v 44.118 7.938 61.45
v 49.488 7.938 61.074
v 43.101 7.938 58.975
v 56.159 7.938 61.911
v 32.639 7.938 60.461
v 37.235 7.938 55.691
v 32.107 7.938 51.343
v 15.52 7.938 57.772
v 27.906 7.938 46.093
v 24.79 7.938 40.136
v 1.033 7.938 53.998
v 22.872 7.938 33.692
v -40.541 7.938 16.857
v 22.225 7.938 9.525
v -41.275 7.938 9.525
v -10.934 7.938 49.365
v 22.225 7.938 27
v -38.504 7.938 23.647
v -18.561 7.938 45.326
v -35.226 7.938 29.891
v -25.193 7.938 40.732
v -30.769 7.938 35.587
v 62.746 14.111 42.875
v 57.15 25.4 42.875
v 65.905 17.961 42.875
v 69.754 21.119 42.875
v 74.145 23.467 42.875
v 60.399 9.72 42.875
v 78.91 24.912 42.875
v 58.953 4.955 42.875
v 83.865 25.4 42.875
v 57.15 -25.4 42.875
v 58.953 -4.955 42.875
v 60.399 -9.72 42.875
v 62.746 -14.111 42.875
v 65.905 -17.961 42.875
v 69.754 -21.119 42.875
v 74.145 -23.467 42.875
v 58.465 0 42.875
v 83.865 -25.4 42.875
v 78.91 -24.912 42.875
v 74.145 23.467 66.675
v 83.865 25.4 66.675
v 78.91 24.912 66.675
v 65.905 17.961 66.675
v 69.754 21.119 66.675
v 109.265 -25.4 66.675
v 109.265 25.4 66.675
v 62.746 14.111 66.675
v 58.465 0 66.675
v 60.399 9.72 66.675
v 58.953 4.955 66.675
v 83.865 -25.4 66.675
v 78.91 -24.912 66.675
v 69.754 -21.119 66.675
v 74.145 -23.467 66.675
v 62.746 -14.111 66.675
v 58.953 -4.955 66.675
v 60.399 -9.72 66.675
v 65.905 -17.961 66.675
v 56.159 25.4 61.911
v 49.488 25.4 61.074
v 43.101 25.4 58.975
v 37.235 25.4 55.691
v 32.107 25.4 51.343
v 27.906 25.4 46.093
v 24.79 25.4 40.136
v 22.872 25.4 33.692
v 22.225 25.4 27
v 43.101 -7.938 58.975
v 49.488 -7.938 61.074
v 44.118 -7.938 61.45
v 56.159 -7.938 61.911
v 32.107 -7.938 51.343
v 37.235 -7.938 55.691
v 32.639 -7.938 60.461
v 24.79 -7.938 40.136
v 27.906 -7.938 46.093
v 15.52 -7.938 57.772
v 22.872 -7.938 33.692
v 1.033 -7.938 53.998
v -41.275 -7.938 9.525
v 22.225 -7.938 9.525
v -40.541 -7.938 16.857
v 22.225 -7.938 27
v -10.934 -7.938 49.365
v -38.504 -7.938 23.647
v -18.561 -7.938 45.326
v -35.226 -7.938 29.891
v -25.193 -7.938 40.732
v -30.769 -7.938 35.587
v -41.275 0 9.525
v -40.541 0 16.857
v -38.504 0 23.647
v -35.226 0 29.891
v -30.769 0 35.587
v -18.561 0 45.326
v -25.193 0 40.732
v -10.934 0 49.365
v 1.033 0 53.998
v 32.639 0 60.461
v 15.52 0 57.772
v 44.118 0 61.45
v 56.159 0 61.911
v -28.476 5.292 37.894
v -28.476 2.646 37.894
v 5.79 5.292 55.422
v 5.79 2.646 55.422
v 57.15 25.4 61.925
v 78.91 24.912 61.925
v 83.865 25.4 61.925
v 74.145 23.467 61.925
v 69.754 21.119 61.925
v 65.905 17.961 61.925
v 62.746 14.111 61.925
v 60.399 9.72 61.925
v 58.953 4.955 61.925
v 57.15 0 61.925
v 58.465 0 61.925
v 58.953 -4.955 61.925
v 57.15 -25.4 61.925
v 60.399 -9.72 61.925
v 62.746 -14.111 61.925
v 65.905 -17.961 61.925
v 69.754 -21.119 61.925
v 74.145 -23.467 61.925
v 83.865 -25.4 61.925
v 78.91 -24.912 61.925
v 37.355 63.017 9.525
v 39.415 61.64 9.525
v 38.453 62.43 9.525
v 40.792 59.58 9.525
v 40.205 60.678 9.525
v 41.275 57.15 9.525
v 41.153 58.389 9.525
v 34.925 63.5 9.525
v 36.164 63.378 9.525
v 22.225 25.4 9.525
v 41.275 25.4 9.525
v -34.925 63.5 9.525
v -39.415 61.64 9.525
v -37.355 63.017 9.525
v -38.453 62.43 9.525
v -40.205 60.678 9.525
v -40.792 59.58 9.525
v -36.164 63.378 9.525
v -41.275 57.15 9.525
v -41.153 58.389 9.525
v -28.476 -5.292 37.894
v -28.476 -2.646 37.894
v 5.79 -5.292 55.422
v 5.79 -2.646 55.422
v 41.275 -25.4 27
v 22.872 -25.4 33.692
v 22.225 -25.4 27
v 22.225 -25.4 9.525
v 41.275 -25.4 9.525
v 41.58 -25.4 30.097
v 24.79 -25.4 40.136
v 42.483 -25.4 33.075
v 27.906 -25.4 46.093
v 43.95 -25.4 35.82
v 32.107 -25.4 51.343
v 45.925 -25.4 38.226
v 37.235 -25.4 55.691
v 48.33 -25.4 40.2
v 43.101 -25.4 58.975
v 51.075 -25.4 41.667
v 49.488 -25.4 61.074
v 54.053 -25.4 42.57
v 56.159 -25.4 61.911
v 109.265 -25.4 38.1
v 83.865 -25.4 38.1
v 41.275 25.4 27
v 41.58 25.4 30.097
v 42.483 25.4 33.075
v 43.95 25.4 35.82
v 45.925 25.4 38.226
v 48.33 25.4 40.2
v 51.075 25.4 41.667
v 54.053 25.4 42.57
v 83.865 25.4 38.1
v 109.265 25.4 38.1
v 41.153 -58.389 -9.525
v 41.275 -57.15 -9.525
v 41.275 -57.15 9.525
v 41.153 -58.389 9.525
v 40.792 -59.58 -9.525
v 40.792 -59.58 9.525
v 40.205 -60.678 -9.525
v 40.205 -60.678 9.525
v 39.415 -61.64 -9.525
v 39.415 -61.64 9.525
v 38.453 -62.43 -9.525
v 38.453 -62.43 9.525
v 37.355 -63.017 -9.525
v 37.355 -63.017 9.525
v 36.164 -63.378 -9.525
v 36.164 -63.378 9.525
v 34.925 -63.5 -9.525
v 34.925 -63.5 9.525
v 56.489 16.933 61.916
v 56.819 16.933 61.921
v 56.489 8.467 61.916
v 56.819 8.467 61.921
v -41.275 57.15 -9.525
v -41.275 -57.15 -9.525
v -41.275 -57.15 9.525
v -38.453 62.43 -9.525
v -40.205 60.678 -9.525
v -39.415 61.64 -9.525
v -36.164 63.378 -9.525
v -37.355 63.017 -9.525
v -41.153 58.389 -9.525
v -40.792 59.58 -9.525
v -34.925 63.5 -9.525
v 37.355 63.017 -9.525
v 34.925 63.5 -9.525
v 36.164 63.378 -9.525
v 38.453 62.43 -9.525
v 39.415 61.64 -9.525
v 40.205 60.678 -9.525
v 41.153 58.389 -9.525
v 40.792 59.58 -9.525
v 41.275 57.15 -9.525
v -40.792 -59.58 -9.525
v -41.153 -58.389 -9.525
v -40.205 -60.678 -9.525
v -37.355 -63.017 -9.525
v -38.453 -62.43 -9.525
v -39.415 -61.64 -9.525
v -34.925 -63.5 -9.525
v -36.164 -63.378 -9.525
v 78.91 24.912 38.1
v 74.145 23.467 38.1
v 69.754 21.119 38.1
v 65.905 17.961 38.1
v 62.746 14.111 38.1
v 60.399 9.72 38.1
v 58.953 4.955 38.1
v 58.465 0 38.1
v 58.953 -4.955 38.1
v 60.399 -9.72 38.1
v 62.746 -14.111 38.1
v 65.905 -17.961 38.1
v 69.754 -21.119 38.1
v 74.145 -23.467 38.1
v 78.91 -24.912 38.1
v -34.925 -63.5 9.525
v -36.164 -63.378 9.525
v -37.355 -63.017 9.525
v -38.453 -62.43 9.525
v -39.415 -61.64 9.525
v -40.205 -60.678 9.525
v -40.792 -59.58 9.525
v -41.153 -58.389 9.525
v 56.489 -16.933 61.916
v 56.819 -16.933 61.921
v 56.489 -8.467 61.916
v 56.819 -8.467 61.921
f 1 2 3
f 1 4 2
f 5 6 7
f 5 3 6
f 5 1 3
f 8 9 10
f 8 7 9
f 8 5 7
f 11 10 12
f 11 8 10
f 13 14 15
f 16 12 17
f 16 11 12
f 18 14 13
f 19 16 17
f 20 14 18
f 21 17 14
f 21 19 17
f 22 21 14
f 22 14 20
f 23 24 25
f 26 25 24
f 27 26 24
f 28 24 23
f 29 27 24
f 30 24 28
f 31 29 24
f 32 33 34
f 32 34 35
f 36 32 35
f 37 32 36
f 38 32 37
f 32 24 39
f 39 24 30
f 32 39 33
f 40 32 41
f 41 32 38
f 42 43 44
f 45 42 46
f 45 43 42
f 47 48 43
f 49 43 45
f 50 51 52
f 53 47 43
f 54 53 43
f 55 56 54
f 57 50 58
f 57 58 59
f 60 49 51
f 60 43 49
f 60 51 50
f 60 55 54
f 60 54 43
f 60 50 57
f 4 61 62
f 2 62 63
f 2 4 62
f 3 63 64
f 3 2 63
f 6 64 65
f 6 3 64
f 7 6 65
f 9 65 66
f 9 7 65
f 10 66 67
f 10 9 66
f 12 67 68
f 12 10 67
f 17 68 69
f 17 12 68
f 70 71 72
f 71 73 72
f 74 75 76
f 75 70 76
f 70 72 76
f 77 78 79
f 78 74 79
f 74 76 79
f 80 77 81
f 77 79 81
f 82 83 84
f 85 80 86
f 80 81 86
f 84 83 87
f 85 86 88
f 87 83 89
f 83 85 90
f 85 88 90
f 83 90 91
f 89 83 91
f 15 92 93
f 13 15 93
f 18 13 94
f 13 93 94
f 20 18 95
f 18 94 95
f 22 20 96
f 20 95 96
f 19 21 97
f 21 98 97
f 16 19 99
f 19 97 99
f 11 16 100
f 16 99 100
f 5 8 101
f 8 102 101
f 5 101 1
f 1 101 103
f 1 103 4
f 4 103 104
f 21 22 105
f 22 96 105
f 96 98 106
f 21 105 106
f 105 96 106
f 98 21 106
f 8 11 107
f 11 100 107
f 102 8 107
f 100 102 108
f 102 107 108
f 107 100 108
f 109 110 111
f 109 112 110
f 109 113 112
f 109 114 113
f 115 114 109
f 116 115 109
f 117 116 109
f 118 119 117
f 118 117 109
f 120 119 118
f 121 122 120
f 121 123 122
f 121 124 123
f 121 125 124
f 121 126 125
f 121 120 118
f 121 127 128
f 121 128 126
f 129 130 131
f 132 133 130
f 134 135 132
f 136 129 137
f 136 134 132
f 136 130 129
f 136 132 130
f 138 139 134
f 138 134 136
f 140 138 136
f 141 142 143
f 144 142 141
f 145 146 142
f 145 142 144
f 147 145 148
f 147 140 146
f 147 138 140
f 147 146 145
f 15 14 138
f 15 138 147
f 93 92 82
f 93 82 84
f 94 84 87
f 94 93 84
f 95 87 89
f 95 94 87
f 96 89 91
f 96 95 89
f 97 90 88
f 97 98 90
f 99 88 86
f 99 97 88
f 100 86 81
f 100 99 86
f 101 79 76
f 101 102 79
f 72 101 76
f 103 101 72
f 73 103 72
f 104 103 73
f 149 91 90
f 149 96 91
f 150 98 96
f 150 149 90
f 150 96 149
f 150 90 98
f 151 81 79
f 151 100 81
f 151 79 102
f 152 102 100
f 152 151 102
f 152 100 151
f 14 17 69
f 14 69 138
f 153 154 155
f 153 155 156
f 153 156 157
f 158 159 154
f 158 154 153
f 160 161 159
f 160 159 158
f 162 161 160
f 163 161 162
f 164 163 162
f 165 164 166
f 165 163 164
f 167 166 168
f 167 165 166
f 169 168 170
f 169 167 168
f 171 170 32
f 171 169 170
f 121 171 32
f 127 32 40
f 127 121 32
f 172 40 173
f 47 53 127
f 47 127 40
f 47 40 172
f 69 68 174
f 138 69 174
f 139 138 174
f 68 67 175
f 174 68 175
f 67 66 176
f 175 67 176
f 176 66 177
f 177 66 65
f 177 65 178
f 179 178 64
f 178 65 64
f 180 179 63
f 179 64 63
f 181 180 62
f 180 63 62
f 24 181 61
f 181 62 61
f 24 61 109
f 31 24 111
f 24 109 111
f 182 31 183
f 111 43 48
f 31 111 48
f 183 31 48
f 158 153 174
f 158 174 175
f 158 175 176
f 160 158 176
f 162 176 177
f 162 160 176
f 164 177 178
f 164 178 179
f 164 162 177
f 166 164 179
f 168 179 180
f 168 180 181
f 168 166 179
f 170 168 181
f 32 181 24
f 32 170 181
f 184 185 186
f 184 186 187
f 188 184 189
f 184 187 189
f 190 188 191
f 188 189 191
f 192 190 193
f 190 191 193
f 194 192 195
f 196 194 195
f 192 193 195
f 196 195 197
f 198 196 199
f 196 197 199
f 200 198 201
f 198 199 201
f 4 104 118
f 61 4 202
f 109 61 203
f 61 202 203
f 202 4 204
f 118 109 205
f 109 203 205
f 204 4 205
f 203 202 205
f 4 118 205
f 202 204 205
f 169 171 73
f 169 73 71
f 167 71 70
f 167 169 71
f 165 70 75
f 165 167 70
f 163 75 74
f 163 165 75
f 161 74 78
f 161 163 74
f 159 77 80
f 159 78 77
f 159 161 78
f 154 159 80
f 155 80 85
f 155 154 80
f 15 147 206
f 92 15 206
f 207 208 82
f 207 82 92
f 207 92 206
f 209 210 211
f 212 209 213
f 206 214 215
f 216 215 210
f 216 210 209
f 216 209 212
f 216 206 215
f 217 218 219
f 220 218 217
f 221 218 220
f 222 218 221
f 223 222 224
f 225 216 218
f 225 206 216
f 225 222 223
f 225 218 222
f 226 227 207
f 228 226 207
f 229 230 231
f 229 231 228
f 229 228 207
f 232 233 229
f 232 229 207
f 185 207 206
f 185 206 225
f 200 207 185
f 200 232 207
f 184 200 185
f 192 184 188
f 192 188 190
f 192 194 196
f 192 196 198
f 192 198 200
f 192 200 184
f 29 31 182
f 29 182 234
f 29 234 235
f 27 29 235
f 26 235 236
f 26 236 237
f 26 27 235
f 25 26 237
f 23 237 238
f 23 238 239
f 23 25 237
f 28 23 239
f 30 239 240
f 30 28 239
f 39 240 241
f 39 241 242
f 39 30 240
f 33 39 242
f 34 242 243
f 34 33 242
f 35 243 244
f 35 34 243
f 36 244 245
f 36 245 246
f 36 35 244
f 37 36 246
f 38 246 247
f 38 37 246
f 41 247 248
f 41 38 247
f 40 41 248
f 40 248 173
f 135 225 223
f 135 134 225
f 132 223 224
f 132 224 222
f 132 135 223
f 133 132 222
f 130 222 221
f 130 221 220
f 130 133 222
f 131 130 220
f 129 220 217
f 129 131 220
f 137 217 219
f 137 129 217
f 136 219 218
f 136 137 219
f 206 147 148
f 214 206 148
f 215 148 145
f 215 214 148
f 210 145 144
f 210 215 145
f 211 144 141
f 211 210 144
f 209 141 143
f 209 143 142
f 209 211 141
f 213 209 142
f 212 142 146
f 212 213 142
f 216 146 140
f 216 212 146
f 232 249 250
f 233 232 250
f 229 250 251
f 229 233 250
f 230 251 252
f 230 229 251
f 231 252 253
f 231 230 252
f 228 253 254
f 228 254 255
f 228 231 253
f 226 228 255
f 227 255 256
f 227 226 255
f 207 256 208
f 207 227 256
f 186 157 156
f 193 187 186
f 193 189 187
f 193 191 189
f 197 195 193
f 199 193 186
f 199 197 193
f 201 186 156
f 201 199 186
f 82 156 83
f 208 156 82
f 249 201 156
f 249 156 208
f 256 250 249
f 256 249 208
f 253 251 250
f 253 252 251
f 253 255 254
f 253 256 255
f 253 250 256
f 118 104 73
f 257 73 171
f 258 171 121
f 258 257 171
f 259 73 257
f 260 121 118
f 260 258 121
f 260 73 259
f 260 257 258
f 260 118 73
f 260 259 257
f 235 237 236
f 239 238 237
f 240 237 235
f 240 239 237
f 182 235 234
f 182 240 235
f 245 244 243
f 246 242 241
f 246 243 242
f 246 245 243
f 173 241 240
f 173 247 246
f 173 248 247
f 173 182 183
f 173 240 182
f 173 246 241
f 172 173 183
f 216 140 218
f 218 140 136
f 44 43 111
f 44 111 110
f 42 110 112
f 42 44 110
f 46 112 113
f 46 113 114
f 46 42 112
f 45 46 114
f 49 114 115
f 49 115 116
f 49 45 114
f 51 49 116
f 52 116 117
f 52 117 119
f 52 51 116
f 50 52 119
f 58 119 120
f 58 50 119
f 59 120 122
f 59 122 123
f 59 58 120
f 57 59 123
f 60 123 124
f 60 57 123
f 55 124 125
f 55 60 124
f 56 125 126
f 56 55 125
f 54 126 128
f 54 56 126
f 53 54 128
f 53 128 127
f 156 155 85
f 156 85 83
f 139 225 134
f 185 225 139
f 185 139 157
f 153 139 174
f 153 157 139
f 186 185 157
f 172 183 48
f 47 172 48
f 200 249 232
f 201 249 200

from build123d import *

# Parameters (mm, degrees)
F1_DEPTH = 63.5
F0_W     = 25.4
F0_H     = 19.05
F2_DEPTH = 25.4
F3_DEPTH = 7.9375
F5_R     = 6.35


with BuildPart() as f1:
    # F0 (on Front) → F1 (new body, symmetric)
    with BuildSketch(Plane.XZ):
        Polygon((22.225, 9.525), (-41.275, 9.525), (-41.275, -9.525), (41.275, -9.525), (41.275, 9.525), align=None)
    extrude(amount=F1_DEPTH, both=True)

    # F0 (on Front) → F2 (join, symmetric)
    with BuildSketch(Plane.XZ):
        with BuildLine():
            Line((22.225, 27.0002), (22.225, 9.525))
            Line((22.225, 9.525), (41.275, 9.525))
            Line((41.275, 9.525), (41.275, 27.0002))
            ThreePointArc((41.275, 27.0002), (45.9246798487, 38.2255201513), (57.15, 42.8752))
            Line((57.15, 42.8752), (58.465048489, 42.8752))
            Line((58.465048489, 42.8752), (58.465048489, 61.9252))
            Line((58.465048489, 61.9252), (57.15, 61.9252))
            add(Edge.make_bspline(
                [(56.1593998767, 61.9111486608), (56.4890557248, 61.9164037237), (56.8192573531, 61.9210875625), (57.15, 61.9252)],
                knots=[110.8592289818, 110.8592289818, 110.8592289818, 110.8592289818, 111.5045361635, 111.5045361635, 111.5045361635, 111.5045361635], degree=3))
            ThreePointArc((56.1593998767, 61.9111486608), (32.1065144768, 51.3431549941), (22.225, 27.0002))
        make_face()
        with Locations((71.165048489, 52.4002)):
            Rectangle(F0_W, F0_H)
        Polygon((83.865048489, 66.675), (83.865048489, 61.9252), (83.865048489, 42.8752), (83.865048489, 38.1), (109.265048489, 38.1), (109.265048489, 66.675), align=None)
    extrude(amount=F2_DEPTH, both=True)

    # F0 (on Front) → F3 (join, symmetric)
    with BuildSketch(Plane.XZ):
        with BuildLine():
            add(Edge.make_bspline(
                [(-41.275, 9.525), (-40.9981963046, 43.2471461139), (-0.4731530978, 61.0083658582), (56.1593998767, 61.9111486608)],
                knots=[0, 0, 0, 0, 110.8592289818, 110.8592289818, 110.8592289818, 110.8592289818], degree=3))
            Line((-41.275, 9.525), (22.225, 9.525))
            Line((22.225, 9.525), (22.225, 27.0002))
            ThreePointArc((22.225, 27.0002), (32.1065144768, 51.3431549941), (56.1593998767, 61.9111486608))
        make_face()
    extrude(amount=F3_DEPTH, both=True)

    # F0 (on Front) → F4 (revolve)
    with BuildSketch(Plane.XZ):
        Polygon((83.865048489, 66.675), (83.865048489, 61.9252), (83.865048489, 42.8752), (83.865048489, 38.1), (109.265048489, 38.1), (109.265048489, 66.675), align=None)
    revolve(axis=Axis((83.865048489, 0, 52.3875), (0, 0, 1)))

    # F5
    f5_edges = [f1.edges().sort_by_distance(p)[0] for p in [
        (-41.275, 63.5, 0),
        (-41.275, -63.5, 0),
        (41.275, -63.5, 0),
        (41.275, 63.5, 0),
    ]]
    fillet(f5_edges, radius=F5_R)


solid = f1.part
